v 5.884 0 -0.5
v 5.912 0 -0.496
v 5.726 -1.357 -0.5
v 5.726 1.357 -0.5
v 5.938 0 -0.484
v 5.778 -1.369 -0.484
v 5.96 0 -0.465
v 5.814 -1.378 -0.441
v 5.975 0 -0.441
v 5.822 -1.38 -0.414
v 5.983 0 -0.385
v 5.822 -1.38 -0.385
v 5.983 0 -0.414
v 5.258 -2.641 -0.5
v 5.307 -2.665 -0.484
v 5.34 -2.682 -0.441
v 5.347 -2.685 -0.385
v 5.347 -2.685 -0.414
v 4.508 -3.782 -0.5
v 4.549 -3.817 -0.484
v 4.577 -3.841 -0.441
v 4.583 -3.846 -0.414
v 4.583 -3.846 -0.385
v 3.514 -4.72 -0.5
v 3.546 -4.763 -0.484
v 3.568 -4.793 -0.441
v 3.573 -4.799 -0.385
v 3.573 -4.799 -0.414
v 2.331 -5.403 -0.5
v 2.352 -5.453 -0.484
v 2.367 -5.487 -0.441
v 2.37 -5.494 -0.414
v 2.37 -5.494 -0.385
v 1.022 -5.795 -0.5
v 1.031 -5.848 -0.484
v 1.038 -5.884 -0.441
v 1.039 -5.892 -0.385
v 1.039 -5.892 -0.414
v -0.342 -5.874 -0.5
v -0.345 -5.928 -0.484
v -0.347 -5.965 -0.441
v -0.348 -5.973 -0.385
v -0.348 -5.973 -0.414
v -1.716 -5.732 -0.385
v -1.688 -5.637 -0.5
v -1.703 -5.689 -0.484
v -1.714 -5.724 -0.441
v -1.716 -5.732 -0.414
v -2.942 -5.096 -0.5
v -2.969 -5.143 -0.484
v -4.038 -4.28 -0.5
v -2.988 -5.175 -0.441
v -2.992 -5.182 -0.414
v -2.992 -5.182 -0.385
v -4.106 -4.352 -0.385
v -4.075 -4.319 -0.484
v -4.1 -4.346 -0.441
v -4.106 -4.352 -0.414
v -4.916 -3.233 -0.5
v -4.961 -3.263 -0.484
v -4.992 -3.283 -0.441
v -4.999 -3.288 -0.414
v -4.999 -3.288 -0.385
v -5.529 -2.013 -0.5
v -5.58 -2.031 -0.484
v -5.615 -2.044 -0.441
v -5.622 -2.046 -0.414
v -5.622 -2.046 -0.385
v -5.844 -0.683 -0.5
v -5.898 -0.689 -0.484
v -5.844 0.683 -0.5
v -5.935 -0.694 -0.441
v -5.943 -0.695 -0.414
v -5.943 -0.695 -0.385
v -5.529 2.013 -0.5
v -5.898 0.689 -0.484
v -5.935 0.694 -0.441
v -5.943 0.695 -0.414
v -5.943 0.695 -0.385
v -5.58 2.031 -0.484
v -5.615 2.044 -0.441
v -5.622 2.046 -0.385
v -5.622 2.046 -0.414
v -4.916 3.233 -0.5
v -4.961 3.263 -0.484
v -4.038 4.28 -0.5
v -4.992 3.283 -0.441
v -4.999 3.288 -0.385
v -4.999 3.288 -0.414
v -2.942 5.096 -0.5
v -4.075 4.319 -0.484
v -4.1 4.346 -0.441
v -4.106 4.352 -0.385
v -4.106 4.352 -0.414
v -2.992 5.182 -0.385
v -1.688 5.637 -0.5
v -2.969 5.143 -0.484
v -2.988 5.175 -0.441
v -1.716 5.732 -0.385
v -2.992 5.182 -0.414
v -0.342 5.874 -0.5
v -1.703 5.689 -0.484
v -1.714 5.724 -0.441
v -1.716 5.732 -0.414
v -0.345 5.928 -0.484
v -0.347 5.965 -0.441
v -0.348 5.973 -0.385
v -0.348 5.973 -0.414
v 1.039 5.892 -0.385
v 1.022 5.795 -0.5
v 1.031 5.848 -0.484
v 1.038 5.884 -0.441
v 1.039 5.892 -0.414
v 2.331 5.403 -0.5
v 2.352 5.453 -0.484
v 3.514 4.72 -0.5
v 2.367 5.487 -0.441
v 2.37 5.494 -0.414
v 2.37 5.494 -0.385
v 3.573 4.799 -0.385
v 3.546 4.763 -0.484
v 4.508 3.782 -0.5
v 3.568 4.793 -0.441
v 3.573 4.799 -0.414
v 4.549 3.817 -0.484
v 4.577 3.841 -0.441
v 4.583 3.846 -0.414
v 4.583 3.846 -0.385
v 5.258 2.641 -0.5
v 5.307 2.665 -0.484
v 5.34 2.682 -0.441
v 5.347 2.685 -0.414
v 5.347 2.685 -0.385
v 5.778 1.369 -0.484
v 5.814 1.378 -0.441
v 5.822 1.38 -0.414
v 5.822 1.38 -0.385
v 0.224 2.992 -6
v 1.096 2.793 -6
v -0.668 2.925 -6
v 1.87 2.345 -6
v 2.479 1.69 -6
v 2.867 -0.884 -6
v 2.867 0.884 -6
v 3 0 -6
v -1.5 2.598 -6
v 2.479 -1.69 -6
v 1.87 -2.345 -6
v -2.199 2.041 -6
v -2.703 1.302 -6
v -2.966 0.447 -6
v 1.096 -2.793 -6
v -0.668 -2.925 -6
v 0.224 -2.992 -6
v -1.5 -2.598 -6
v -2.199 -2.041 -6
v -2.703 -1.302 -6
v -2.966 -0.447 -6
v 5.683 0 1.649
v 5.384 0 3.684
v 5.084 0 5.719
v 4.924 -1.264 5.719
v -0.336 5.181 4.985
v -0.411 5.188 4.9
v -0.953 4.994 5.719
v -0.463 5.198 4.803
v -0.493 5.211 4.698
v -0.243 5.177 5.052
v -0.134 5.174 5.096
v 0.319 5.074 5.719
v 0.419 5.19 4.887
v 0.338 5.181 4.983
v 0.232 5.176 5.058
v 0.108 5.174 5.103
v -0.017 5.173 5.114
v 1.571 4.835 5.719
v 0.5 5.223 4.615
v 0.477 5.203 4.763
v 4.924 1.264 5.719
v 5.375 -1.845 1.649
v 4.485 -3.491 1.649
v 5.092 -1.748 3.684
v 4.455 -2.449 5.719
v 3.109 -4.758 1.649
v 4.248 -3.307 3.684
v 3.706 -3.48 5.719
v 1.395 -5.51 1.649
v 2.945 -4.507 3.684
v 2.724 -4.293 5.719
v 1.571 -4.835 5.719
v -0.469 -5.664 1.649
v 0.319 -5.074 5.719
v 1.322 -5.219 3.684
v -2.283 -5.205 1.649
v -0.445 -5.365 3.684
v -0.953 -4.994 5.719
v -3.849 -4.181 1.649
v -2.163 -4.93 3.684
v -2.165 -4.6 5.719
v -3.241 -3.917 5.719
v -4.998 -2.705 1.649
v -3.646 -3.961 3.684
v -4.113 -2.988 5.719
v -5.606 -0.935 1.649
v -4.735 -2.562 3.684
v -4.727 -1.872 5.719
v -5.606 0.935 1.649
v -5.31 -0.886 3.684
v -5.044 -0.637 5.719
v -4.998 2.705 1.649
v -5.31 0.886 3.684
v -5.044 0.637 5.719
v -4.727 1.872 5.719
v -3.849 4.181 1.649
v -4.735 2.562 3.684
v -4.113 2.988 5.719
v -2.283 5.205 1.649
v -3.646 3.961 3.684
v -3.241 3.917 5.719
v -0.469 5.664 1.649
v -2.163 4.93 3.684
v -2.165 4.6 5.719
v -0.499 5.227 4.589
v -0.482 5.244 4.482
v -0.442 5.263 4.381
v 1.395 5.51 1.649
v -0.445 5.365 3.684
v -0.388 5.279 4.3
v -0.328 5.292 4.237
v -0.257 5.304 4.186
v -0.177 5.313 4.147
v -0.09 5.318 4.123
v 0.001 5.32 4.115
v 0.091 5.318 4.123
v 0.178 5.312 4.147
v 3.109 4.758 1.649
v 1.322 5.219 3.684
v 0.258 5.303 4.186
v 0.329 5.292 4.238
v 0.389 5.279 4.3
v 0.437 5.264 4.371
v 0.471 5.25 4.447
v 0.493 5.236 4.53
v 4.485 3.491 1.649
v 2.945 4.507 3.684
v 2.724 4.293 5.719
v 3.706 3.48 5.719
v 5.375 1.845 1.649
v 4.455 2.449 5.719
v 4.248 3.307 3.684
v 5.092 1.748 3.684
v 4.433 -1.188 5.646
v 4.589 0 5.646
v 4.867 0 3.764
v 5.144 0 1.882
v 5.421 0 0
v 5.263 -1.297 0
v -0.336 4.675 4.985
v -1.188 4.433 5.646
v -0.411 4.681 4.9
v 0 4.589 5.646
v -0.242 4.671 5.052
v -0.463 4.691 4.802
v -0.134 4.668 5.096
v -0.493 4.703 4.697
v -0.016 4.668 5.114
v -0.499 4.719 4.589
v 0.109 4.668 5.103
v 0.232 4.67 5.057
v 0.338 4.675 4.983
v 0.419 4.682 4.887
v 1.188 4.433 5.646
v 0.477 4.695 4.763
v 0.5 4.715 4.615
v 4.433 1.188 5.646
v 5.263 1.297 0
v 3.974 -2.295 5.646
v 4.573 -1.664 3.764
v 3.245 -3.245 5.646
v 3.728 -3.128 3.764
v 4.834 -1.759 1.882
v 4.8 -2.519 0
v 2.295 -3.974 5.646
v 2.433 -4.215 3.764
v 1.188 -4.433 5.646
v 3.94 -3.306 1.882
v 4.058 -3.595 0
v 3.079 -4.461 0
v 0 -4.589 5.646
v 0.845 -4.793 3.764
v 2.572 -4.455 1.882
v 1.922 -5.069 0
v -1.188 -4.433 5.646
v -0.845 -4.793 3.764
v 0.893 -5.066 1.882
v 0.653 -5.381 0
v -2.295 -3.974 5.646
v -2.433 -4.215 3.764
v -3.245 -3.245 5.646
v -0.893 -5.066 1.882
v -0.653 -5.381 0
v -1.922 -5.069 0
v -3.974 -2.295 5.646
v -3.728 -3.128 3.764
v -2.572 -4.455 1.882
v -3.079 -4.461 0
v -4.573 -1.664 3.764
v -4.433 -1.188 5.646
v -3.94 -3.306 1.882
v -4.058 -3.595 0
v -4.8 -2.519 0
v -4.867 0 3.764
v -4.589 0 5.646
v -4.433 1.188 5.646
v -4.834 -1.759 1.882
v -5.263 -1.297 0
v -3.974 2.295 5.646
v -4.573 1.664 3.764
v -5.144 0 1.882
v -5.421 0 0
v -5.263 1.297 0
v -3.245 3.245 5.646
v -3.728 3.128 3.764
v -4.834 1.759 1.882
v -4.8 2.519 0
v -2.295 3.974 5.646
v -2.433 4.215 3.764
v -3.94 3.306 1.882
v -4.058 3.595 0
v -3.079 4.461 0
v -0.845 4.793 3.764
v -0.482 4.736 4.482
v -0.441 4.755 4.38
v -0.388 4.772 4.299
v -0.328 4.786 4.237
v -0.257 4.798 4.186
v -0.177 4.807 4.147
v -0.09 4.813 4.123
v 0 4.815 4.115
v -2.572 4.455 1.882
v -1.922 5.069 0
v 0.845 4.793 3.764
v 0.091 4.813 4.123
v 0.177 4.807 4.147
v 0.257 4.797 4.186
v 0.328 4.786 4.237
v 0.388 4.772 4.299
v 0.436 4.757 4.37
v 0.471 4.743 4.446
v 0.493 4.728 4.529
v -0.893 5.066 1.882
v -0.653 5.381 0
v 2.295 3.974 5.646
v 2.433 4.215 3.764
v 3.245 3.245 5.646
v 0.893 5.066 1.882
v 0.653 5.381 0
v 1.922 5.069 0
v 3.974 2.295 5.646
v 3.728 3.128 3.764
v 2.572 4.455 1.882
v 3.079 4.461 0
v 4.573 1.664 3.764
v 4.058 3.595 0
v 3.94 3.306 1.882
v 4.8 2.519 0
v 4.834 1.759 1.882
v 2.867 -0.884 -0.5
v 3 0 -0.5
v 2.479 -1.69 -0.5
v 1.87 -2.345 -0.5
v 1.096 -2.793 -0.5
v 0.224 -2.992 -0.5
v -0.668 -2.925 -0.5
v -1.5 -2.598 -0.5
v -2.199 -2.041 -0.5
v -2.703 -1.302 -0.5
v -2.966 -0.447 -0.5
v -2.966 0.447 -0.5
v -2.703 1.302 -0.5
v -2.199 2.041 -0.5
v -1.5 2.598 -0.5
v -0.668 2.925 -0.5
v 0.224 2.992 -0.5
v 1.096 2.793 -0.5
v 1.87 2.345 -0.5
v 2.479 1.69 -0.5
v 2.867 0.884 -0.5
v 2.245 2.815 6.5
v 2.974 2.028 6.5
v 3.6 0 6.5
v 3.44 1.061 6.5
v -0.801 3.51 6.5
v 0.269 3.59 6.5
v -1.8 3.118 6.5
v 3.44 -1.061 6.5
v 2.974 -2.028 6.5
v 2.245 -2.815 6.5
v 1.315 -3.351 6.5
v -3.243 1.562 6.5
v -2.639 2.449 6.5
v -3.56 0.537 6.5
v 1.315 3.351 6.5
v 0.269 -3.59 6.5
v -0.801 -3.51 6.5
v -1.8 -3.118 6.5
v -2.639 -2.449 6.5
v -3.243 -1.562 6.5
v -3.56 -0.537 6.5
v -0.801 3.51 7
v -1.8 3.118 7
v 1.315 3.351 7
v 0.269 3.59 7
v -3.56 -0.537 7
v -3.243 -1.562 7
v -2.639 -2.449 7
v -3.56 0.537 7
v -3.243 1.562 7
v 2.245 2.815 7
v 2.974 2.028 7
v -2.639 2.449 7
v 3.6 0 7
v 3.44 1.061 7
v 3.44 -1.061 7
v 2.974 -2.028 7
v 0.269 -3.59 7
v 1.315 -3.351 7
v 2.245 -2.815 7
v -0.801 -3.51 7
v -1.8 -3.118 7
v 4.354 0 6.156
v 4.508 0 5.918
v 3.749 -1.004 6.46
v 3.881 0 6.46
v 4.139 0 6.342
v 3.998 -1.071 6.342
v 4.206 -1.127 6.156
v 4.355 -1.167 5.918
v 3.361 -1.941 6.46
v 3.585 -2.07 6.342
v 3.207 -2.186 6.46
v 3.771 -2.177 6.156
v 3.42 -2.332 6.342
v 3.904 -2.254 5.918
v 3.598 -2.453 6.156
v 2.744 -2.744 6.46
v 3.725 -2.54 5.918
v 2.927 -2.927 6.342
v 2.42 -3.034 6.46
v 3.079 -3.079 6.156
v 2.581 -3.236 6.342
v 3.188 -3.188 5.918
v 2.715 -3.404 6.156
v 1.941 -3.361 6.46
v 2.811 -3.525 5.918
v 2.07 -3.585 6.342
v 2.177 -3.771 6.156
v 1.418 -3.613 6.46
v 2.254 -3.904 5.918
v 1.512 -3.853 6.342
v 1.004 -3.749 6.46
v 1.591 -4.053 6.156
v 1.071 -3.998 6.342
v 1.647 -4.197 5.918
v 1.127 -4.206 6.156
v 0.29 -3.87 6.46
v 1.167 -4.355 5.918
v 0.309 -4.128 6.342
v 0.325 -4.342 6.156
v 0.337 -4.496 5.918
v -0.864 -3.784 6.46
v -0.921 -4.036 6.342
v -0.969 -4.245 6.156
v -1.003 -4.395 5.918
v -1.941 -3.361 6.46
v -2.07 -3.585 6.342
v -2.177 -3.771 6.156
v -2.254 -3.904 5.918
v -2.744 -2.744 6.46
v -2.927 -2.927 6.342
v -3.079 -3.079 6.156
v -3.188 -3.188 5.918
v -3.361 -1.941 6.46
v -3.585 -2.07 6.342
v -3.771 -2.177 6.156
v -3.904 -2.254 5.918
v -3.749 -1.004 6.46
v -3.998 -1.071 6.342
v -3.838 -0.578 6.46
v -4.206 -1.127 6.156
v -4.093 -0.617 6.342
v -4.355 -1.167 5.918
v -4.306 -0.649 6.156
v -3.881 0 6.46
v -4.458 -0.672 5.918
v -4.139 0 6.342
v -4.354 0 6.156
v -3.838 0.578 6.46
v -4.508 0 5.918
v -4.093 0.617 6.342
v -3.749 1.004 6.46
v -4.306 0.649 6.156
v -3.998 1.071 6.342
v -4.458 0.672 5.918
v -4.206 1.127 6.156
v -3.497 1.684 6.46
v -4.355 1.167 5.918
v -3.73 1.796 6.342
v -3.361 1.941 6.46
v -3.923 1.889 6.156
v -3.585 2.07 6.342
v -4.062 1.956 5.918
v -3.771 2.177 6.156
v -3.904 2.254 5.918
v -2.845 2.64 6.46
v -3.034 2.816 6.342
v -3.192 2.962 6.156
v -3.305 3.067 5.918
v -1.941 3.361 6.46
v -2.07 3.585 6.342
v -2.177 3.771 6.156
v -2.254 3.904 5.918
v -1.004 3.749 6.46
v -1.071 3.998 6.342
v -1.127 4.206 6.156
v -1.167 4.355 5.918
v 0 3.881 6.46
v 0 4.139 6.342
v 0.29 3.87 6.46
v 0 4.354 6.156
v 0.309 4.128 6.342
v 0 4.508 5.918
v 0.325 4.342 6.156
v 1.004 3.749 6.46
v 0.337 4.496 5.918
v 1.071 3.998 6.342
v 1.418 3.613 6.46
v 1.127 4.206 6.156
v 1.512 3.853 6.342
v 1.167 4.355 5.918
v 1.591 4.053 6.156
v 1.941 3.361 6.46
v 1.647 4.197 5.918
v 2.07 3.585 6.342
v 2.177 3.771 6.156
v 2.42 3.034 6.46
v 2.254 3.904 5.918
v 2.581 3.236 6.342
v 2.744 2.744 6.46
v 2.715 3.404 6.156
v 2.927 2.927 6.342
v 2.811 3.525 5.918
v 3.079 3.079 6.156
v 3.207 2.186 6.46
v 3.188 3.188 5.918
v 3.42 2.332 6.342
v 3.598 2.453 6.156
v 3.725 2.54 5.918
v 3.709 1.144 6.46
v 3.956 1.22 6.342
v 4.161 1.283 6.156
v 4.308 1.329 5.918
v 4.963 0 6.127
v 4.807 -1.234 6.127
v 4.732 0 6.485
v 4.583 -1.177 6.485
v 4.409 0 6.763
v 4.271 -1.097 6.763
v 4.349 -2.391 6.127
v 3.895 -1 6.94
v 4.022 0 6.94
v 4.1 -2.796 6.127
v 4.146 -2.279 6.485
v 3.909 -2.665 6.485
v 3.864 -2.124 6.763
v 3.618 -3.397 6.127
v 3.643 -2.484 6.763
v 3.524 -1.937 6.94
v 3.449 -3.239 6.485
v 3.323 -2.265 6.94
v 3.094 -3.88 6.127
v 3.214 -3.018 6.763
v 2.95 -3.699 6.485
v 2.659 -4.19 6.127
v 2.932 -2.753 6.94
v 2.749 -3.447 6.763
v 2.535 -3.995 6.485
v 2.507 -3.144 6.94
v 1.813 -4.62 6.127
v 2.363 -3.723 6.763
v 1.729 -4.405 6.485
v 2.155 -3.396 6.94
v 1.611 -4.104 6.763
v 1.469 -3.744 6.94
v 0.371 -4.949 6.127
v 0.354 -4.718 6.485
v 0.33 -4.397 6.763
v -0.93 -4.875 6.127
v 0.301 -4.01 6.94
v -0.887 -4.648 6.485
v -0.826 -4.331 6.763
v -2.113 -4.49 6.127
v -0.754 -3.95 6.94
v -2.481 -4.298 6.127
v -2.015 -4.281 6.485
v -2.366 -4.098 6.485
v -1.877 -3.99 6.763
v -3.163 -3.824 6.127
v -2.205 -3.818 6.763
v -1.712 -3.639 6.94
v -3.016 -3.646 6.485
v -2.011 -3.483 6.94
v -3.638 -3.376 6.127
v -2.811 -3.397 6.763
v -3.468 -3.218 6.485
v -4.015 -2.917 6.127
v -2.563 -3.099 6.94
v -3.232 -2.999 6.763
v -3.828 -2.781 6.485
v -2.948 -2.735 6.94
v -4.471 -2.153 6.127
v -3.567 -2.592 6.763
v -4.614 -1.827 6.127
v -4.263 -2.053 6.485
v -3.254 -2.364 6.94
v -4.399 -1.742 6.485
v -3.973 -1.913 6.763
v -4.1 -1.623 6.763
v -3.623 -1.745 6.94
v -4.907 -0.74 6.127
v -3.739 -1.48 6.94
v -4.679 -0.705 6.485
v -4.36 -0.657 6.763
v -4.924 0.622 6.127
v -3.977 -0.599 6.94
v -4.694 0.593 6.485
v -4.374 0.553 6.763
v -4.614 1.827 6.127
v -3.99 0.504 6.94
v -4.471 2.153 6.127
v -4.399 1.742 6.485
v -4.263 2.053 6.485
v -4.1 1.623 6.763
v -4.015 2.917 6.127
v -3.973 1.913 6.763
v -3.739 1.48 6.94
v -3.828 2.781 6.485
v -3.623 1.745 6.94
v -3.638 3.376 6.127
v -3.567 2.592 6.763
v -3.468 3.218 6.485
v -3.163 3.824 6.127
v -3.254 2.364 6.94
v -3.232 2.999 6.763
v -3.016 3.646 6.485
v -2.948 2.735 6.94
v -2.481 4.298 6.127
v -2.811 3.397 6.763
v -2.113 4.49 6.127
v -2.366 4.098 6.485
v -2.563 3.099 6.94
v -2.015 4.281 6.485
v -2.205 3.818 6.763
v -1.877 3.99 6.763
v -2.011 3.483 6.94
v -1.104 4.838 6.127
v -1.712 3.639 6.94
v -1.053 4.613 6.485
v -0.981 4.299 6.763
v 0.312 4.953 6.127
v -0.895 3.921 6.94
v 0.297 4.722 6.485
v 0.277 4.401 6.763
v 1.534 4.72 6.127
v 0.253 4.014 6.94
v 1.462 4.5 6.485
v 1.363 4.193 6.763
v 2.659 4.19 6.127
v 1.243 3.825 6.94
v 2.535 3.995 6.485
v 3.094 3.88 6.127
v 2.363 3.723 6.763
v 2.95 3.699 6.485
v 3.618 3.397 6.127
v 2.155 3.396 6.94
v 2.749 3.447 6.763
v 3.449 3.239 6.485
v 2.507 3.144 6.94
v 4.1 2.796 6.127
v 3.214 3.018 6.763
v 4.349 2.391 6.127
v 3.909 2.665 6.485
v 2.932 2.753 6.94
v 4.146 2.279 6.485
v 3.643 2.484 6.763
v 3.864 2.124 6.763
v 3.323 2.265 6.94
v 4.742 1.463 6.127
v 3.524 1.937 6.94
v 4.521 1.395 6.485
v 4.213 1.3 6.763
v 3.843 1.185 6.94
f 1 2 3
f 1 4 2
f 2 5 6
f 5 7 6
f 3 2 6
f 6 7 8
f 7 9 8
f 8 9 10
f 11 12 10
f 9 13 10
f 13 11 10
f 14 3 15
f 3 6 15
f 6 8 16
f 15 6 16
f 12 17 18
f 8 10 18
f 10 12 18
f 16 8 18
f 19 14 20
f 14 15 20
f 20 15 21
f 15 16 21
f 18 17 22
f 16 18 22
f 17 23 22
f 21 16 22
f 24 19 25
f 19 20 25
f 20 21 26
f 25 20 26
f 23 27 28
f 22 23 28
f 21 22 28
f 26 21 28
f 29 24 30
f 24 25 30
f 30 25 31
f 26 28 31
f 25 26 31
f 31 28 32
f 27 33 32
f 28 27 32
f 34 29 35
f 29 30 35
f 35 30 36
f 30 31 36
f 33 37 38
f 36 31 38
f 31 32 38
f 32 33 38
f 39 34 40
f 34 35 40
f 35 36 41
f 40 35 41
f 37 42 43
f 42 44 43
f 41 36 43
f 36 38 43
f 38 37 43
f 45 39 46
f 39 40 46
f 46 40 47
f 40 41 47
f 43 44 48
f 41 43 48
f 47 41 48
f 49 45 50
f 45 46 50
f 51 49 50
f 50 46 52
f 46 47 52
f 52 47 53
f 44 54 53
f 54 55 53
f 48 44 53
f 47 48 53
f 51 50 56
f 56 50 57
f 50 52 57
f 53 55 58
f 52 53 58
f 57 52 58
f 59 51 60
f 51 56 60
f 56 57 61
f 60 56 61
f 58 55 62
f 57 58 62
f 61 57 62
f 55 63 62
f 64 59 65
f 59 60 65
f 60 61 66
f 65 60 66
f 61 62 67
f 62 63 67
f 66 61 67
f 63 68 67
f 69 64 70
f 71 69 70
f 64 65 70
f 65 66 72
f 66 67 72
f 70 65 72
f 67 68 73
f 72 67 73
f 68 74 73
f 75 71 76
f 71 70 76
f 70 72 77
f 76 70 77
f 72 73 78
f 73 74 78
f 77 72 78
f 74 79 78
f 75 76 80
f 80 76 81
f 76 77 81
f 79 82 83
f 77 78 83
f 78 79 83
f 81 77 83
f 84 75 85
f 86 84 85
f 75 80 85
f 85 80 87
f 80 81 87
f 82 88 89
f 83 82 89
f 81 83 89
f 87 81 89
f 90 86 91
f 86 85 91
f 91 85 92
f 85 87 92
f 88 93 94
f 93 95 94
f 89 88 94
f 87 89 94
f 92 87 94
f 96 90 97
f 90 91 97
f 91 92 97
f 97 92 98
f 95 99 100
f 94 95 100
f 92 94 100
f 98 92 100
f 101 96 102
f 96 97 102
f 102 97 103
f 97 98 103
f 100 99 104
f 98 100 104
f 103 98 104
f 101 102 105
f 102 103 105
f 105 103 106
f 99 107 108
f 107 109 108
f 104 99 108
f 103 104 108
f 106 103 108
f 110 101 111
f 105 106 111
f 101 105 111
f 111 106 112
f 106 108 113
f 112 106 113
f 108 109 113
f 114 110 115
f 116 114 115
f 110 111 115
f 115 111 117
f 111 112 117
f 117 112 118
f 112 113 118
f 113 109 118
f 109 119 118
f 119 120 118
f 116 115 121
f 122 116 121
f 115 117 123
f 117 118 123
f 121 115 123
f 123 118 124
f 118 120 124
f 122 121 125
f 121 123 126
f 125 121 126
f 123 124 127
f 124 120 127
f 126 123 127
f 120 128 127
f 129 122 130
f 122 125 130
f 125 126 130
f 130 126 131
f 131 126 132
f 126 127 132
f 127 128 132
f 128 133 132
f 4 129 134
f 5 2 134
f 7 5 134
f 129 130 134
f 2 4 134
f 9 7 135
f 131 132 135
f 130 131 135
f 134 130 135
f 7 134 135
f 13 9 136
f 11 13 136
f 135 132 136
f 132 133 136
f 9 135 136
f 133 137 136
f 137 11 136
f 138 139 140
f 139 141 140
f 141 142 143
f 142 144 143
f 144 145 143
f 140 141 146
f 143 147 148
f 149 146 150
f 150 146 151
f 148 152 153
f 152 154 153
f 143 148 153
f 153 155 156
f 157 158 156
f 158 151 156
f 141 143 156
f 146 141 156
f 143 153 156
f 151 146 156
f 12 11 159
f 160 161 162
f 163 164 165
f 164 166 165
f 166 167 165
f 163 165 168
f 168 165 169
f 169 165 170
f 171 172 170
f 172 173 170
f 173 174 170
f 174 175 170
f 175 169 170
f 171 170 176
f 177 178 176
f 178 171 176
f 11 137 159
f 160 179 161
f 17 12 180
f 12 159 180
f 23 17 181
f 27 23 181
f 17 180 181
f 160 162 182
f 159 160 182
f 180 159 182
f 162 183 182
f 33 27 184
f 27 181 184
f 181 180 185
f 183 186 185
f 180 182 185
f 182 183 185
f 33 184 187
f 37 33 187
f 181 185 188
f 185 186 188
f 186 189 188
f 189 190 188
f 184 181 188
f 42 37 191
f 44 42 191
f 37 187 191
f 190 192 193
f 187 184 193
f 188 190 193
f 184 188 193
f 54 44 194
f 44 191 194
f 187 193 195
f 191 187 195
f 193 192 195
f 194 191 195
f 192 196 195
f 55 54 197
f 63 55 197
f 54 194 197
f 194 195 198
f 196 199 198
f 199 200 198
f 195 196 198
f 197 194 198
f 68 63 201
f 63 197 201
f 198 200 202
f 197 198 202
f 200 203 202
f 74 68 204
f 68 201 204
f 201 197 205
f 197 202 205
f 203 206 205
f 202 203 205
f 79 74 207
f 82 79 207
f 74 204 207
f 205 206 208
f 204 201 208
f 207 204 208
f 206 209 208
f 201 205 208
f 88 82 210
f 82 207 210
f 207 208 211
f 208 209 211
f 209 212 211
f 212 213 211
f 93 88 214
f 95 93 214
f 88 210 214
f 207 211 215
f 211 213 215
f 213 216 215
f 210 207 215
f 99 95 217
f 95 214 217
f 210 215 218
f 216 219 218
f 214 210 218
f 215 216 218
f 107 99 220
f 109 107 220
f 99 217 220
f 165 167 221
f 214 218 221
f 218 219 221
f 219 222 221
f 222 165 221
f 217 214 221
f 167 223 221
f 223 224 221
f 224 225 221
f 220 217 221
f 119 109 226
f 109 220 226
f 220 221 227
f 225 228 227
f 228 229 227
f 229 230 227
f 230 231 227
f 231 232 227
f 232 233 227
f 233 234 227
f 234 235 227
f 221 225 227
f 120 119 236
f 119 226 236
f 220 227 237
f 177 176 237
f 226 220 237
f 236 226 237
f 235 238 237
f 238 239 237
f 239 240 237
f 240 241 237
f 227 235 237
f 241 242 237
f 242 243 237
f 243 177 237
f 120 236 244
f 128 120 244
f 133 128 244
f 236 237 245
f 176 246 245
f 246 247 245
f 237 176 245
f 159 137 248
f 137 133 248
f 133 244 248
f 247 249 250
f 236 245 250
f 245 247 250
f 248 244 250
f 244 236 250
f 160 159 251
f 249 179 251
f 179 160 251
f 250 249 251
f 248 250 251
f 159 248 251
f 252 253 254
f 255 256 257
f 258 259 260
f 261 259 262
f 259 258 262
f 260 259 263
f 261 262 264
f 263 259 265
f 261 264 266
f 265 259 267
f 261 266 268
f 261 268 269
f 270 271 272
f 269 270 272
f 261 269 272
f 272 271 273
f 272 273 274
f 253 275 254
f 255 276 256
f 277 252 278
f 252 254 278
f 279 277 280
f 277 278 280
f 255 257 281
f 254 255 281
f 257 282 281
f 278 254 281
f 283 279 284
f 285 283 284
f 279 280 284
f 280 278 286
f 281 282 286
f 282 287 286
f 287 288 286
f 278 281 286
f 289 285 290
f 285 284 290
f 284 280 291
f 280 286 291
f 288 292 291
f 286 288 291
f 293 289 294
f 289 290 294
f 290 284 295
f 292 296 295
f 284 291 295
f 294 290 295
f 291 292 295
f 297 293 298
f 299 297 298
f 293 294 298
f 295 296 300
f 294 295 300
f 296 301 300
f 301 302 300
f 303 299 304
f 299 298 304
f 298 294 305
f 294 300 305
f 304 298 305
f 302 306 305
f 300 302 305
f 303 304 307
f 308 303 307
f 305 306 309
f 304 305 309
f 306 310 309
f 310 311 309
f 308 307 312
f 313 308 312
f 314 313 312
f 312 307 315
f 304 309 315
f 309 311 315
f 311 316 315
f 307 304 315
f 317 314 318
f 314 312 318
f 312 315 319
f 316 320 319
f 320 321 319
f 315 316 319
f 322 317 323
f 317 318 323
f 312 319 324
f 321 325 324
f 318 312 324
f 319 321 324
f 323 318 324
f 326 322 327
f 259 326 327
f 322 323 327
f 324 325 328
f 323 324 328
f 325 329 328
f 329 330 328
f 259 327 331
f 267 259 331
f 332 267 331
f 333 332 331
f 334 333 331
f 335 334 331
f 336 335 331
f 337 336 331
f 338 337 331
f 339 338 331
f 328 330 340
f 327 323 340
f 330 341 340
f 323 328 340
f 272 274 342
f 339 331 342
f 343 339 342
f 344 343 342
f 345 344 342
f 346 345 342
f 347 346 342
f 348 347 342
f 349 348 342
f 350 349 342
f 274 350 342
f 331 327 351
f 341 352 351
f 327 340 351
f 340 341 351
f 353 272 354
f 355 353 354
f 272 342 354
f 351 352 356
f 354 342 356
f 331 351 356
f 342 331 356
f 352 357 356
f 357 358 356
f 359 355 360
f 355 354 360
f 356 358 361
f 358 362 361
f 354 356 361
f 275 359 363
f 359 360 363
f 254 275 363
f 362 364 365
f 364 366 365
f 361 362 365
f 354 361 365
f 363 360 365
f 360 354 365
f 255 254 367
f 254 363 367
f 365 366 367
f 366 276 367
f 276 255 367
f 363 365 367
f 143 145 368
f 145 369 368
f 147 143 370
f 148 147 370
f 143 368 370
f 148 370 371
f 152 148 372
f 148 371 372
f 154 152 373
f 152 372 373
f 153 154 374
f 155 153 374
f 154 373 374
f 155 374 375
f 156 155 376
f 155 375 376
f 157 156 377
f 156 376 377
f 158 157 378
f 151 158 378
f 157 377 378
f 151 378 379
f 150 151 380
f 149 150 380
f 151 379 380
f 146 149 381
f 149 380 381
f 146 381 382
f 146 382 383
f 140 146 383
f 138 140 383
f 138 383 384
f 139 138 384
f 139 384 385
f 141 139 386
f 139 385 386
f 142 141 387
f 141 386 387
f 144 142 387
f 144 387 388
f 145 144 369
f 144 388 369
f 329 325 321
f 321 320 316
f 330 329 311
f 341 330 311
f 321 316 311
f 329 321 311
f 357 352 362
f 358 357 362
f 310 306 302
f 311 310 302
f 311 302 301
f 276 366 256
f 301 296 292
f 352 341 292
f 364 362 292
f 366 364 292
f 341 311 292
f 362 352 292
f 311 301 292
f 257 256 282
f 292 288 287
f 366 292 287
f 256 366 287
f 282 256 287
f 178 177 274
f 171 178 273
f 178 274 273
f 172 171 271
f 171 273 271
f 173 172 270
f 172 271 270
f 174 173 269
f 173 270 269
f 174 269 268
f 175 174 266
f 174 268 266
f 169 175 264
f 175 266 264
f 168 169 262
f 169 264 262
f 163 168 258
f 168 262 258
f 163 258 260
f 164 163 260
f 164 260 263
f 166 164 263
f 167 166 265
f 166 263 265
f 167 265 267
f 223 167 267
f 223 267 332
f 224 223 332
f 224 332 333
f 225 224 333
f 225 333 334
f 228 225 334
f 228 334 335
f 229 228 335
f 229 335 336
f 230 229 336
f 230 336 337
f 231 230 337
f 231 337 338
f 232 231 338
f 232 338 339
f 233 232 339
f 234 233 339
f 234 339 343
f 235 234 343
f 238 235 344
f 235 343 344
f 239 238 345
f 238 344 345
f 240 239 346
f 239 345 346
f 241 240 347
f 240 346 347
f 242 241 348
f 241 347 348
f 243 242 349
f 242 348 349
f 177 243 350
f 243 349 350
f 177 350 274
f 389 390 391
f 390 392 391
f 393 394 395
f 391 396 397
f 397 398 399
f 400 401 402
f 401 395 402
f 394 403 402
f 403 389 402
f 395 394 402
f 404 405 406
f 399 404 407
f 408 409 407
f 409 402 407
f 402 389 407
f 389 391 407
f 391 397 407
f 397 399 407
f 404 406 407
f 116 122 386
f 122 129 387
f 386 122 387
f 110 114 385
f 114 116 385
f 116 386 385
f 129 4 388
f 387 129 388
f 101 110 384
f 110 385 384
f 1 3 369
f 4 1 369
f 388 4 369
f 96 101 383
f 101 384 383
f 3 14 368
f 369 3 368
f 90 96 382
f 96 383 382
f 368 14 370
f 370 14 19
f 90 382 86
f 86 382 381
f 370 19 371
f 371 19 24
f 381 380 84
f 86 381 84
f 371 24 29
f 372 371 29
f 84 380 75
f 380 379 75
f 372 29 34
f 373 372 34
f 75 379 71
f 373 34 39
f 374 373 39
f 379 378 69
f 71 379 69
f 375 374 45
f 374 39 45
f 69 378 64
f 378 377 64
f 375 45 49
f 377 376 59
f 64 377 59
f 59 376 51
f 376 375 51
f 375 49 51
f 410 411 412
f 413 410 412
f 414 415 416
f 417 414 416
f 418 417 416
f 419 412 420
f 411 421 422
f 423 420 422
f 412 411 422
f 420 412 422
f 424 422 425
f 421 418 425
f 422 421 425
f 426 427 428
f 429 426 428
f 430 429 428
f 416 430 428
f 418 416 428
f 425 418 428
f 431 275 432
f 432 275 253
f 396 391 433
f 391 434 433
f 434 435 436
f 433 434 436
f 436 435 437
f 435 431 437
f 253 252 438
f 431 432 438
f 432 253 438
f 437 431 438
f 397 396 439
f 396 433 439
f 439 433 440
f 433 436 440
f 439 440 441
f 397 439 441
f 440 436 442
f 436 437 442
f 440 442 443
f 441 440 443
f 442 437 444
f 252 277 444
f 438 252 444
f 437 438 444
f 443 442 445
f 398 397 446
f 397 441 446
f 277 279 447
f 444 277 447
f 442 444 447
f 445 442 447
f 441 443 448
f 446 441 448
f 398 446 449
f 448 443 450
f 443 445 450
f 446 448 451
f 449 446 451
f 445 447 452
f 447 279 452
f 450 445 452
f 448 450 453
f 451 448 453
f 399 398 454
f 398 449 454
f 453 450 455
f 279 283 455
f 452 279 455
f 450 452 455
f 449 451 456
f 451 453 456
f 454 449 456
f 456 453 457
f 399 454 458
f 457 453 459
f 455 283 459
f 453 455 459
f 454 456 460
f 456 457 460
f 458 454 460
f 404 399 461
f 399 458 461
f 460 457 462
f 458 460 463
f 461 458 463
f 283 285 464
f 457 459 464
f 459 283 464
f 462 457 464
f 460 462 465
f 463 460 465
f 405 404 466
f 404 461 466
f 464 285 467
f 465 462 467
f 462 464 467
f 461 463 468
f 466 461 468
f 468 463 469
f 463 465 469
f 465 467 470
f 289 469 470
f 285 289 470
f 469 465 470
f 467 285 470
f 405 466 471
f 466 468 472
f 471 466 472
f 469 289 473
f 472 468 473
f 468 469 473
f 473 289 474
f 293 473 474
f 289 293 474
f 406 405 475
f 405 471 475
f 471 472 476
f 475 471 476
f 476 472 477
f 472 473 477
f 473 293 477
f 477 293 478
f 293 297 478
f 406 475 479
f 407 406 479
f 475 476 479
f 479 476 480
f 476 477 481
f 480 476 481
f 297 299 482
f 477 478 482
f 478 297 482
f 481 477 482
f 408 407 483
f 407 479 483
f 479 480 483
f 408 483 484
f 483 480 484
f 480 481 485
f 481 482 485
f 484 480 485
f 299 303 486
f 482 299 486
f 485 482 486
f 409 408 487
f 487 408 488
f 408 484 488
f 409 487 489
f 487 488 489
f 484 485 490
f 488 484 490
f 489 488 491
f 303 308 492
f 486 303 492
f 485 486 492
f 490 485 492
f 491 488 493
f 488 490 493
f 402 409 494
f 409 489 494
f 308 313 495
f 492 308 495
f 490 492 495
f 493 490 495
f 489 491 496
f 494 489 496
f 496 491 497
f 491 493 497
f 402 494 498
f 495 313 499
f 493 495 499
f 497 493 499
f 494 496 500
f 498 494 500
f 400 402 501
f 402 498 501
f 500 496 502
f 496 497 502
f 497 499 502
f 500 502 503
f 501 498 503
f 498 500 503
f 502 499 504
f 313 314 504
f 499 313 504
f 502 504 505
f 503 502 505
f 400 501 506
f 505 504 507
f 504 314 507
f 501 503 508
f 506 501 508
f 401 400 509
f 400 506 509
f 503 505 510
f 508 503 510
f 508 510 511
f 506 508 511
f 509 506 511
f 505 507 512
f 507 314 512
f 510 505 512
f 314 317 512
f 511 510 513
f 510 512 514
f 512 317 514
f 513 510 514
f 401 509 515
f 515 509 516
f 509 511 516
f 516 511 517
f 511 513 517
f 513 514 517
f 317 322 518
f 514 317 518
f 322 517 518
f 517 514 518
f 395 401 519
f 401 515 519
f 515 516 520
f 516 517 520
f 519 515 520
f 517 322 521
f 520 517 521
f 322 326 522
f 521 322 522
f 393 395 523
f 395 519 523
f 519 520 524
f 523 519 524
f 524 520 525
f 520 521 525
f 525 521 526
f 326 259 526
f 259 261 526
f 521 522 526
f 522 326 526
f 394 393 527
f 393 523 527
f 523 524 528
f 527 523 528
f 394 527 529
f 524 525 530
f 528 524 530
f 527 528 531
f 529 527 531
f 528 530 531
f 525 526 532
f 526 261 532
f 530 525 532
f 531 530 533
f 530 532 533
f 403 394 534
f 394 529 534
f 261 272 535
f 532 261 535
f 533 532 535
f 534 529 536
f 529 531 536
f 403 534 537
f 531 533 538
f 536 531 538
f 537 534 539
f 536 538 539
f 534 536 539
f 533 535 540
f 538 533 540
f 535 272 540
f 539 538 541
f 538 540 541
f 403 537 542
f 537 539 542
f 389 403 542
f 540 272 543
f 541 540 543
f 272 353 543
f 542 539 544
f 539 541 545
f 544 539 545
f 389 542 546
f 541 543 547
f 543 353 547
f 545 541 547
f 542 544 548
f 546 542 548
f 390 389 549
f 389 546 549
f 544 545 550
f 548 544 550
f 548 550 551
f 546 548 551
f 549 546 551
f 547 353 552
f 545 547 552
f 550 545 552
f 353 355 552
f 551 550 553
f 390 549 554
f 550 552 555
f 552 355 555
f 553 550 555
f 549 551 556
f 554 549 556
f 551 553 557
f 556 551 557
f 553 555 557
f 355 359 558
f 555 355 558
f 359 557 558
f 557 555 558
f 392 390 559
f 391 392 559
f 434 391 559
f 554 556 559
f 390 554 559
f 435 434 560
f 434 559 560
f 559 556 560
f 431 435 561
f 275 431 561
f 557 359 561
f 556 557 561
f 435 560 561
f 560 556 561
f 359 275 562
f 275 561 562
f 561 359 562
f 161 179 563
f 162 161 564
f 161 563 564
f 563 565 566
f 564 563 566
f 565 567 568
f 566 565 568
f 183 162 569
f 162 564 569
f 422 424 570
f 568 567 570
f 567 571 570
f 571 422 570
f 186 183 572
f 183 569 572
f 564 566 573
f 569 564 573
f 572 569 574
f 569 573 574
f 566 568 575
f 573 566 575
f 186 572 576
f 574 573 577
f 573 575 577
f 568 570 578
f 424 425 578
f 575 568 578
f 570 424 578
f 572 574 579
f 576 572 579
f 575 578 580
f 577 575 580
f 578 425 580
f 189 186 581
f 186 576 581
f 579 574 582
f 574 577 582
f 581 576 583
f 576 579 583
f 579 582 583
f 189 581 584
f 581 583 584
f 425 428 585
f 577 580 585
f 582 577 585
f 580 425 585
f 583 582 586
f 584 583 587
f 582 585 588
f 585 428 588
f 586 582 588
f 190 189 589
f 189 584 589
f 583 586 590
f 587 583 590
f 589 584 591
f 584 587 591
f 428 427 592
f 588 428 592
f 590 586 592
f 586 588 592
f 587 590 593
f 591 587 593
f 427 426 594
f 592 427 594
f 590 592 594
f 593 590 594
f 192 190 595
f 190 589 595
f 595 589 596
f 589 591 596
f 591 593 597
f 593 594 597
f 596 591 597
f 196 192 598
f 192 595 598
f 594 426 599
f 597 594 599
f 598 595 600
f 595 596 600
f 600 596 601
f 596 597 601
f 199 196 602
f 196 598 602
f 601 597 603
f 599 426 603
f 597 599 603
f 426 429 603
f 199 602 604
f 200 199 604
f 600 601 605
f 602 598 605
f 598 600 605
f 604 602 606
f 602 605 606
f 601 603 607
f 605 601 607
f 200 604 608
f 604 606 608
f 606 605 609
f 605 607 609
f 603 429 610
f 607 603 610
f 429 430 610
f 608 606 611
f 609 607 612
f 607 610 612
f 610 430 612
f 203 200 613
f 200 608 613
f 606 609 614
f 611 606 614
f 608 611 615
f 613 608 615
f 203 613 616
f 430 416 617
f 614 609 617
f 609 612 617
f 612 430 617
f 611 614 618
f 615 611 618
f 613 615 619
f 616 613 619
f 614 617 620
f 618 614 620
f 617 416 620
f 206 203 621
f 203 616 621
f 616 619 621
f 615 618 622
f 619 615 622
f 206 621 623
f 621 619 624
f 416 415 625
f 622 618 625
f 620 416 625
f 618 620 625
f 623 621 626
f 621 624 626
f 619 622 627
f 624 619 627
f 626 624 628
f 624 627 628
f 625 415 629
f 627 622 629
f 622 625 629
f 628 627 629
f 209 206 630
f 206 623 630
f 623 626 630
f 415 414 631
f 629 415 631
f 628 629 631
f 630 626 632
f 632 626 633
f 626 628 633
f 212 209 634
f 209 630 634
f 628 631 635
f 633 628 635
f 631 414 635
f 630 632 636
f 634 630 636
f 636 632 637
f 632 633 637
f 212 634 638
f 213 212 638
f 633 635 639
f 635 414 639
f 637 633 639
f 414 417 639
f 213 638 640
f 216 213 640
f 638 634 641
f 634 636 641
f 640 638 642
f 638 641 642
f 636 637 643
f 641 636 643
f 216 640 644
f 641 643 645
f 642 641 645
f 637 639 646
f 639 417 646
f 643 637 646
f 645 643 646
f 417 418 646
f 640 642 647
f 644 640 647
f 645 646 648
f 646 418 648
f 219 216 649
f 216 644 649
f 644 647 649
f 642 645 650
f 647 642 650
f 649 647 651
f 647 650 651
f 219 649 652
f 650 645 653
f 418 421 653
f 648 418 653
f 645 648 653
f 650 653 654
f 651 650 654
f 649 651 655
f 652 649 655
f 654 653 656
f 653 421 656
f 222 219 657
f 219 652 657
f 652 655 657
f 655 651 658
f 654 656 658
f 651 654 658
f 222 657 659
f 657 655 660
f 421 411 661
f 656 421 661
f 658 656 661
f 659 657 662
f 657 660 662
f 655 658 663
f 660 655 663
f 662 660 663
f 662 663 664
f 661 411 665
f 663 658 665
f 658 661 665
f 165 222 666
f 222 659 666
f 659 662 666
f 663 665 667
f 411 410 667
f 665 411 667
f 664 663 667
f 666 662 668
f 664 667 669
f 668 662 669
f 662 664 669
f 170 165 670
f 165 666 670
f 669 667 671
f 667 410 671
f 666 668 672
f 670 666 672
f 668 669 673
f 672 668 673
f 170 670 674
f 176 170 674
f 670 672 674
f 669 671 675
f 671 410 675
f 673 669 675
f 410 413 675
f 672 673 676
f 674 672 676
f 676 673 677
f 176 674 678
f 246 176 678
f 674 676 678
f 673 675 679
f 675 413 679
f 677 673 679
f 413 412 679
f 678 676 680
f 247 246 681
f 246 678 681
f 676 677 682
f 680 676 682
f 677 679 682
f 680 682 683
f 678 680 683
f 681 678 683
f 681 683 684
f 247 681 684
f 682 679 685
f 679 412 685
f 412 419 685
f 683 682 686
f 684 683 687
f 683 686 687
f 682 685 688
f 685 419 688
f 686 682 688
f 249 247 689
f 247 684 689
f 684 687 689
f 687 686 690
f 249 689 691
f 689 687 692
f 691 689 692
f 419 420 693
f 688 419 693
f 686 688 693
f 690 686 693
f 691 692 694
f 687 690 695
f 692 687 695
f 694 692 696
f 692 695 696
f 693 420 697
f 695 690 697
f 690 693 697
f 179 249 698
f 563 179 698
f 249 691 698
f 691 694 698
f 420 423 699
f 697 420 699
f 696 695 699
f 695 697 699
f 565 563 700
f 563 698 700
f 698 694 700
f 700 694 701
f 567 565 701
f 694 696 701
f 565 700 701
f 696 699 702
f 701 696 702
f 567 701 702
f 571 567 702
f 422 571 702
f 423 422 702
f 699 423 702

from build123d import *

# Parameters (mm, degrees)
F2_R     = 0.5
F3_DEPTH = 25


with BuildPart() as f1:
    # F0 (on Front) → F1 (revolve)
    with BuildSketch(Plane.XZ):
        with BuildLine():
            Line((5.420953, 0), (0, 0))
            Line((0, 0), (0, -0.5))
            Line((0, -0.5), (0, -6))
            Line((0, -6), (3, -6))
            Line((3, -6), (3, -0.5))
            Line((3, -0.5), (5.884191, -0.5))
            ThreePointArc((5.884191, -0.5), (5.959879, -0.465356), (5.983123, -0.385427))
            Line((5.983123, -0.385427), (5.083987, 5.718595))
            ThreePointArc((5.083987, 5.718595), (4.580334, 6.635318), (3.6, 7))
            Line((3.6, 7), (0, 7))
            Line((0, 7), (0, 6.5))
            Line((0, 6.5), (3.6, 6.5))
            ThreePointArc((3.6, 6.5), (4.253556, 6.256878), (4.589324, 5.64573))
            Line((4.589324, 5.64573), (5.420953, 0))
        make_face()
    revolve(axis=Axis((0, 0, 3.25), (0, 0, -1)))

    # F2 (on Front) → F3 (cut)
    with BuildSketch(Plane.XZ):
        with Locations((0, 4.614573)):
            Circle(F2_R)
    extrude(amount=-F3_DEPTH, mode=Mode.SUBTRACT)


solid = f1.part
